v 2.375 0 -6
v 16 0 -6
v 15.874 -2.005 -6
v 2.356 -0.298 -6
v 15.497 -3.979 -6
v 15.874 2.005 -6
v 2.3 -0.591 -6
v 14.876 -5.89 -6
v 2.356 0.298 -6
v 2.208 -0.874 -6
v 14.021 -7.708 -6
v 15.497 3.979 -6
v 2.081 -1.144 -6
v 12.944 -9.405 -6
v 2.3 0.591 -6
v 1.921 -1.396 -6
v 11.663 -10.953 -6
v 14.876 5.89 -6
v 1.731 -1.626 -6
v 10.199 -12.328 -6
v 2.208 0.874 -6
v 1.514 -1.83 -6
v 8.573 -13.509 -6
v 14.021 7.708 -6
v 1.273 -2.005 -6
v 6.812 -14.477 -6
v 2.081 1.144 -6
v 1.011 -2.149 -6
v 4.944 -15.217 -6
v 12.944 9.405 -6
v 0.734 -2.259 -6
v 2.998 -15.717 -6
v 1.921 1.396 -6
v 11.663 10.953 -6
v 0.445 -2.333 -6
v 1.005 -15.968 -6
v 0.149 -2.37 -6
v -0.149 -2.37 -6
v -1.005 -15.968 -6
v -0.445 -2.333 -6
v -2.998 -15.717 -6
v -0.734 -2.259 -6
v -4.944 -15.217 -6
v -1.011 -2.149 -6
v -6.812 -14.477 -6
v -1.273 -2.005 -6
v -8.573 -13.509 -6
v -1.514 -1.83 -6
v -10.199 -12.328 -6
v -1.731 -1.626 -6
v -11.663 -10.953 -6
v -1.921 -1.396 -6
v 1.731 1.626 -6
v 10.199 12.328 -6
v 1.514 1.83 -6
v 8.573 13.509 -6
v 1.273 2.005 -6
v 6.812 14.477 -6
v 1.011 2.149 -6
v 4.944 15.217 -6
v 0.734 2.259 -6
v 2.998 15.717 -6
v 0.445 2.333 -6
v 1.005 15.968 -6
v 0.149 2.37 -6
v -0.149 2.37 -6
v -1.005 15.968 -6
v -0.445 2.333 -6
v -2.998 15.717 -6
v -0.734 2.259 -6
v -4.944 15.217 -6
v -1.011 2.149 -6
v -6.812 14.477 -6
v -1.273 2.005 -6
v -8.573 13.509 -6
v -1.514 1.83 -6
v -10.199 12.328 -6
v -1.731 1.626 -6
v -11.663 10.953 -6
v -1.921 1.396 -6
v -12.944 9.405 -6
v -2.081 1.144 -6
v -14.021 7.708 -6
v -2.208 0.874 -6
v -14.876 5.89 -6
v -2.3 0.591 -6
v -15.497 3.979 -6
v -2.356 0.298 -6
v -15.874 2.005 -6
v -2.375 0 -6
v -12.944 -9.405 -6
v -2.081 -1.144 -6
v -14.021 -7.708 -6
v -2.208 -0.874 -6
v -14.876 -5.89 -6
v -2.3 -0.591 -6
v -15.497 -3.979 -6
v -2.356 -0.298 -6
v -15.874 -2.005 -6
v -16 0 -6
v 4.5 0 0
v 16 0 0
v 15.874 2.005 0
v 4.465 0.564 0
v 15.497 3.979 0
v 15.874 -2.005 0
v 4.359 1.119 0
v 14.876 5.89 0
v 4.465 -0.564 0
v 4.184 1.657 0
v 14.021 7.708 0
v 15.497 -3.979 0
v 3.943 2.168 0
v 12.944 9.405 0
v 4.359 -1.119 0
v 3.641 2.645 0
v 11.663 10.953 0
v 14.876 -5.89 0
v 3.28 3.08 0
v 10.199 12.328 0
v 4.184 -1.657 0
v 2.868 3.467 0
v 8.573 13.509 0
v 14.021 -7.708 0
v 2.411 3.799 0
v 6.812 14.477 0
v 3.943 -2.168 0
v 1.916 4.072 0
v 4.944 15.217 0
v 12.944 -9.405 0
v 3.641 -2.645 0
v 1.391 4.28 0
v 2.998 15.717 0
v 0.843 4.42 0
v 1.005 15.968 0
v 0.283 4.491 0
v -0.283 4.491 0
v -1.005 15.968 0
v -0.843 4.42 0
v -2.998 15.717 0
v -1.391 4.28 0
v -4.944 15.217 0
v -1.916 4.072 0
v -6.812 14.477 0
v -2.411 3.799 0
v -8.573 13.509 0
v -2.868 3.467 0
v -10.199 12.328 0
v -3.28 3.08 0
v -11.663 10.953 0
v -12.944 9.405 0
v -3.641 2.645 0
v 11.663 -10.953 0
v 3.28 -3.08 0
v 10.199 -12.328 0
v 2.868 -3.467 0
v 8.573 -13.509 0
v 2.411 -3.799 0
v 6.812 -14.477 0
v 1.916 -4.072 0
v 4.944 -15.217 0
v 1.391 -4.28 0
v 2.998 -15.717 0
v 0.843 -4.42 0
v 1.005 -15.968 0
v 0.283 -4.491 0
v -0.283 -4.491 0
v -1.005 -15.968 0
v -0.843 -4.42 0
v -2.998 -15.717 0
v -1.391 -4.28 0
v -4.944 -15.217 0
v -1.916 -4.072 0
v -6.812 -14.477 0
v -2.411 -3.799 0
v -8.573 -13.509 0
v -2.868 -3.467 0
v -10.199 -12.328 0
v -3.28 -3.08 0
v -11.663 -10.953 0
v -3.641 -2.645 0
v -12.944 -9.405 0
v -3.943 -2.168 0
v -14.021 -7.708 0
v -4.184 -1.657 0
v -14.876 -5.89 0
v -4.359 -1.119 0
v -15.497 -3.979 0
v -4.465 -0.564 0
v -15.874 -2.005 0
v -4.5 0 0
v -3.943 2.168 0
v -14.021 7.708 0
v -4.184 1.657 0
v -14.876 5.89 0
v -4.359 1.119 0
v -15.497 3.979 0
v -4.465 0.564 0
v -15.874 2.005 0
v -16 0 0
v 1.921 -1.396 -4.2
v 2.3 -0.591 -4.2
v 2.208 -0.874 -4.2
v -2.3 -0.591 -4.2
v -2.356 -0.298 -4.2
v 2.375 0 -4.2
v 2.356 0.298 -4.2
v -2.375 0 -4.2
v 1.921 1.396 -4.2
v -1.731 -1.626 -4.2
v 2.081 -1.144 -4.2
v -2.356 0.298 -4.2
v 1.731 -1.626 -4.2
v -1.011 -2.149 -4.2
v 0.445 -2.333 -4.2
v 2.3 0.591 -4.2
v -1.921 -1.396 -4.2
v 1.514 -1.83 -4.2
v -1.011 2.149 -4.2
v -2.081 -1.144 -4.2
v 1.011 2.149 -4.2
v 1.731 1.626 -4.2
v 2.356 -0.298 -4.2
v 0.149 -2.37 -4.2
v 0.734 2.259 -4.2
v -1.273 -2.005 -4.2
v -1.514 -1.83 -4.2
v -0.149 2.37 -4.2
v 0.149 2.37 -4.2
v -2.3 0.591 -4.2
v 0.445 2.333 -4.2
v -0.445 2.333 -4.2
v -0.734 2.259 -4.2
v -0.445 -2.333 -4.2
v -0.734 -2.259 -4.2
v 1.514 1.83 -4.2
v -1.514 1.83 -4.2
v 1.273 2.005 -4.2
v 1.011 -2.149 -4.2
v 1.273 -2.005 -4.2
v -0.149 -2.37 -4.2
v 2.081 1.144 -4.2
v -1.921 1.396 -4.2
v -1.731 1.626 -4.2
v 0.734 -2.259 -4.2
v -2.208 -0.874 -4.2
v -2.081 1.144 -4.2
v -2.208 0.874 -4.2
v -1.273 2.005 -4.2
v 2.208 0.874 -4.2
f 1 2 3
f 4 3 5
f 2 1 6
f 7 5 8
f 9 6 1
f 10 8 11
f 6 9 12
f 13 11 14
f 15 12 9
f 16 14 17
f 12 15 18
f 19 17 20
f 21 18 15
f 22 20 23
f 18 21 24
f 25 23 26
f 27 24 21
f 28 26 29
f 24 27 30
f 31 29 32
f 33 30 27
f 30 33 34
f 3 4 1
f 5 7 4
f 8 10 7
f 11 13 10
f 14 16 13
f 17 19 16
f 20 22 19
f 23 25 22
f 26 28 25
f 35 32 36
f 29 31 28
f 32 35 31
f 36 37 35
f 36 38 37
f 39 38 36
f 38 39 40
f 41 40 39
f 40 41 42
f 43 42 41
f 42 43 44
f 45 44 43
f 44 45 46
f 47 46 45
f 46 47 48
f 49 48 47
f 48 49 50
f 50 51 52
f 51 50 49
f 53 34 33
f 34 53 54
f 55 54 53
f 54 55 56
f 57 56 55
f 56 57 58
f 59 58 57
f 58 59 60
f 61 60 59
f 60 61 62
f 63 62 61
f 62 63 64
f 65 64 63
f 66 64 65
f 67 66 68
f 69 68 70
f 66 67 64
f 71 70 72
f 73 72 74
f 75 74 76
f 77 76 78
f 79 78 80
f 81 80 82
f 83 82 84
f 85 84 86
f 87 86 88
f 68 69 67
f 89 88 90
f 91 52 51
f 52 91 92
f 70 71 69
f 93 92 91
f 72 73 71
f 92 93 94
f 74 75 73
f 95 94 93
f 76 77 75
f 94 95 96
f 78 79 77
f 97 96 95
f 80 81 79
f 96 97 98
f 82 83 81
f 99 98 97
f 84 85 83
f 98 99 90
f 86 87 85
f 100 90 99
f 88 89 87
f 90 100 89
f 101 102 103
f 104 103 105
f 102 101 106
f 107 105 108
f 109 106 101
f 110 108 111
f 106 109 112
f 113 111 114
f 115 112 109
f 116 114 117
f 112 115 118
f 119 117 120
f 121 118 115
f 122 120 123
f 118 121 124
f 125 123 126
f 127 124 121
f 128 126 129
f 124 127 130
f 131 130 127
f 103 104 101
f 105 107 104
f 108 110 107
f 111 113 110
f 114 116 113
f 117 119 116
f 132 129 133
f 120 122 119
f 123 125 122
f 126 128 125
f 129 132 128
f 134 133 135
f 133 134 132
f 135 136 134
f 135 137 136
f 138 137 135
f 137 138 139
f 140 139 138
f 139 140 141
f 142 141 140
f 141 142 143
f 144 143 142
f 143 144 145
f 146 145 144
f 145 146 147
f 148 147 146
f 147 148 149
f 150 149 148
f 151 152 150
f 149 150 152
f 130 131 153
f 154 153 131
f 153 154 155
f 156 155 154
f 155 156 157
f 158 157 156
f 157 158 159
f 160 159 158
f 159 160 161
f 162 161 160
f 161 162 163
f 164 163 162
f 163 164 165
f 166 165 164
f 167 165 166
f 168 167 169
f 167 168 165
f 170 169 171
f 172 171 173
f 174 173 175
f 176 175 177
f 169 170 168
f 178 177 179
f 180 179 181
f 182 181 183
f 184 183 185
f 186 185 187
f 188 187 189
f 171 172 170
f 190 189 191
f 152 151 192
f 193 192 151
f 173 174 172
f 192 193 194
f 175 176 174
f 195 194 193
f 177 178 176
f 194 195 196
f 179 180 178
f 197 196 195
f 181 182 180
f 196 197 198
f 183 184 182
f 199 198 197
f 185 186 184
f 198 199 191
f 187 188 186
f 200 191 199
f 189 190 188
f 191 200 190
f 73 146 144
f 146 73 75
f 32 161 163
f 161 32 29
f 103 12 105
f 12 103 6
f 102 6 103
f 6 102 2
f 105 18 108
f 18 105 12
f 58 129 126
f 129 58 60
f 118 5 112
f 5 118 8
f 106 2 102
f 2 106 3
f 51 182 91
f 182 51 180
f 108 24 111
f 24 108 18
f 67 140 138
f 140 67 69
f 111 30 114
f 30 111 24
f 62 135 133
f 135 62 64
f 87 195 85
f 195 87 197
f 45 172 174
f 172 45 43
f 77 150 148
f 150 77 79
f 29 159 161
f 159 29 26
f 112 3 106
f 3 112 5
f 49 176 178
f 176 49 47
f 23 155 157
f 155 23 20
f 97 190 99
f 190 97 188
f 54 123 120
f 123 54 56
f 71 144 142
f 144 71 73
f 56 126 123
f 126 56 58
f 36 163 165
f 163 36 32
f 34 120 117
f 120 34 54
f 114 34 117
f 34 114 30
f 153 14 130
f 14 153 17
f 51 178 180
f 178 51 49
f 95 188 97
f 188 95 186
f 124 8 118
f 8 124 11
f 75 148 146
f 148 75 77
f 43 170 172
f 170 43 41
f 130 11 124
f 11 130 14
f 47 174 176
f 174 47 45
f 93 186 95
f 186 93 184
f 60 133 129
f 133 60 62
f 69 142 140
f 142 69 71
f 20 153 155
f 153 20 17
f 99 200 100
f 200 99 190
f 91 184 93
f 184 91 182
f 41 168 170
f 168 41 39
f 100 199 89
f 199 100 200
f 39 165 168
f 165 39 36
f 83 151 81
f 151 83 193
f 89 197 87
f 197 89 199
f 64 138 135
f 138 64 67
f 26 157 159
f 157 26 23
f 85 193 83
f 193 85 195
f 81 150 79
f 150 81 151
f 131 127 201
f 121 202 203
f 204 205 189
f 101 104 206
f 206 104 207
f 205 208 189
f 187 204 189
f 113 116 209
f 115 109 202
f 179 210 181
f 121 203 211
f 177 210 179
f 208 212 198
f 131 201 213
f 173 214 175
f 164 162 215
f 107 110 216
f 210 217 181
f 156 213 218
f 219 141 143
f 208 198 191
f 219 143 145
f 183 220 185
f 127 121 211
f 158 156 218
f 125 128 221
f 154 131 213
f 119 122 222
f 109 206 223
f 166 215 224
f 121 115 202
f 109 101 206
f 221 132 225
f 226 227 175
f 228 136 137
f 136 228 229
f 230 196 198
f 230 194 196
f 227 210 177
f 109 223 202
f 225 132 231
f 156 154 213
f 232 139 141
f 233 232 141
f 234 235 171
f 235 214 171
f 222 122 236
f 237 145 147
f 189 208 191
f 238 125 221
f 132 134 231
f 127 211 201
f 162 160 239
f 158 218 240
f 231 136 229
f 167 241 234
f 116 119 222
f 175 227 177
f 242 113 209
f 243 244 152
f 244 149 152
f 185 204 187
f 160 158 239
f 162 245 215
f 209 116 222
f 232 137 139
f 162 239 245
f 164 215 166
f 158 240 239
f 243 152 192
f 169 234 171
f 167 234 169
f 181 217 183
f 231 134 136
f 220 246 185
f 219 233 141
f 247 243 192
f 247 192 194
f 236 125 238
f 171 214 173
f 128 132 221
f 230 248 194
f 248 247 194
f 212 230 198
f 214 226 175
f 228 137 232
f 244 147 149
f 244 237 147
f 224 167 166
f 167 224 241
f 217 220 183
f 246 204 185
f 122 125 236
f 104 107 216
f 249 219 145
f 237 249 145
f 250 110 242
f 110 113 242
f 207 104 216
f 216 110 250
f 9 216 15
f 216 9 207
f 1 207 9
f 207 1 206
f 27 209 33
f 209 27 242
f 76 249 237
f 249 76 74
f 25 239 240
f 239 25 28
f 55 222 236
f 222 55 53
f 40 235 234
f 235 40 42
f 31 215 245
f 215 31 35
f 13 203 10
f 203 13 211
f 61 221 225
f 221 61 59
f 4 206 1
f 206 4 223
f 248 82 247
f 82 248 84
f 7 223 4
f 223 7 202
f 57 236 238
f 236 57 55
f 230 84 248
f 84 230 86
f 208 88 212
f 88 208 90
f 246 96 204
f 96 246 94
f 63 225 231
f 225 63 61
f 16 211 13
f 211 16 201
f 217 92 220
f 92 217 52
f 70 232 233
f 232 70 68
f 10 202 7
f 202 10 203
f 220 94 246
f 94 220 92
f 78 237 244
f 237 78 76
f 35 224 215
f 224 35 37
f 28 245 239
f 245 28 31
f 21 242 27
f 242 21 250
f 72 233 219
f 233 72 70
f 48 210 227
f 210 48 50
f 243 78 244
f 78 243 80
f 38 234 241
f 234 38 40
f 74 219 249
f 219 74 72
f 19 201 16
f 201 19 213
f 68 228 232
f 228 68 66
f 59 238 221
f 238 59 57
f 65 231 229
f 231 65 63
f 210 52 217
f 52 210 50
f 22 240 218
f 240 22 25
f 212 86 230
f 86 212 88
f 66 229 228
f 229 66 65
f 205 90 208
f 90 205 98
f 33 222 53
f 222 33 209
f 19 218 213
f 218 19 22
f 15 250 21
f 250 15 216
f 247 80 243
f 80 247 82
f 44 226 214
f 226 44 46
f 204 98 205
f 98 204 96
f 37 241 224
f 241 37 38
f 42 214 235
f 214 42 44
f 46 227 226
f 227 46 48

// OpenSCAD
$fn = 50;


difference() {
	union() {
		translate(v = [0, 0, -6.0000000000]) {
			cylinder(h = 6, r = 7.0000000000);
		}
		translate(v = [0, 0, -6.0000000000]) {
			cylinder(h = 6, r = 16.0000000000);
		}
	}
	union() {
		translate(v = [0, 0, 0]) {
			rotate(a = [0, 0, 0]) {
				difference() {
					union() {
						#translate(v = [0, 0, -6.0000000000]) {
							cylinder(h = 6, r = 2.2500000000);
						}
						#translate(v = [0, 0, -4.2000000000]) {
							cylinder(h = 4.2000000000, r = 7.0000000000, r1 = 2.3750000000, r2 = 4.5000000000);
						}
						#translate(v = [0, 0, -6.0000000000]) {
							cylinder(h = 6, r = 2.3750000000);
						}
						#translate(v = [0, 0, -6.0000000000]) {
							cylinder(h = 6, r = 2.2500000000);
						}
					}
					union();
				}
			}
		}
	}
}
